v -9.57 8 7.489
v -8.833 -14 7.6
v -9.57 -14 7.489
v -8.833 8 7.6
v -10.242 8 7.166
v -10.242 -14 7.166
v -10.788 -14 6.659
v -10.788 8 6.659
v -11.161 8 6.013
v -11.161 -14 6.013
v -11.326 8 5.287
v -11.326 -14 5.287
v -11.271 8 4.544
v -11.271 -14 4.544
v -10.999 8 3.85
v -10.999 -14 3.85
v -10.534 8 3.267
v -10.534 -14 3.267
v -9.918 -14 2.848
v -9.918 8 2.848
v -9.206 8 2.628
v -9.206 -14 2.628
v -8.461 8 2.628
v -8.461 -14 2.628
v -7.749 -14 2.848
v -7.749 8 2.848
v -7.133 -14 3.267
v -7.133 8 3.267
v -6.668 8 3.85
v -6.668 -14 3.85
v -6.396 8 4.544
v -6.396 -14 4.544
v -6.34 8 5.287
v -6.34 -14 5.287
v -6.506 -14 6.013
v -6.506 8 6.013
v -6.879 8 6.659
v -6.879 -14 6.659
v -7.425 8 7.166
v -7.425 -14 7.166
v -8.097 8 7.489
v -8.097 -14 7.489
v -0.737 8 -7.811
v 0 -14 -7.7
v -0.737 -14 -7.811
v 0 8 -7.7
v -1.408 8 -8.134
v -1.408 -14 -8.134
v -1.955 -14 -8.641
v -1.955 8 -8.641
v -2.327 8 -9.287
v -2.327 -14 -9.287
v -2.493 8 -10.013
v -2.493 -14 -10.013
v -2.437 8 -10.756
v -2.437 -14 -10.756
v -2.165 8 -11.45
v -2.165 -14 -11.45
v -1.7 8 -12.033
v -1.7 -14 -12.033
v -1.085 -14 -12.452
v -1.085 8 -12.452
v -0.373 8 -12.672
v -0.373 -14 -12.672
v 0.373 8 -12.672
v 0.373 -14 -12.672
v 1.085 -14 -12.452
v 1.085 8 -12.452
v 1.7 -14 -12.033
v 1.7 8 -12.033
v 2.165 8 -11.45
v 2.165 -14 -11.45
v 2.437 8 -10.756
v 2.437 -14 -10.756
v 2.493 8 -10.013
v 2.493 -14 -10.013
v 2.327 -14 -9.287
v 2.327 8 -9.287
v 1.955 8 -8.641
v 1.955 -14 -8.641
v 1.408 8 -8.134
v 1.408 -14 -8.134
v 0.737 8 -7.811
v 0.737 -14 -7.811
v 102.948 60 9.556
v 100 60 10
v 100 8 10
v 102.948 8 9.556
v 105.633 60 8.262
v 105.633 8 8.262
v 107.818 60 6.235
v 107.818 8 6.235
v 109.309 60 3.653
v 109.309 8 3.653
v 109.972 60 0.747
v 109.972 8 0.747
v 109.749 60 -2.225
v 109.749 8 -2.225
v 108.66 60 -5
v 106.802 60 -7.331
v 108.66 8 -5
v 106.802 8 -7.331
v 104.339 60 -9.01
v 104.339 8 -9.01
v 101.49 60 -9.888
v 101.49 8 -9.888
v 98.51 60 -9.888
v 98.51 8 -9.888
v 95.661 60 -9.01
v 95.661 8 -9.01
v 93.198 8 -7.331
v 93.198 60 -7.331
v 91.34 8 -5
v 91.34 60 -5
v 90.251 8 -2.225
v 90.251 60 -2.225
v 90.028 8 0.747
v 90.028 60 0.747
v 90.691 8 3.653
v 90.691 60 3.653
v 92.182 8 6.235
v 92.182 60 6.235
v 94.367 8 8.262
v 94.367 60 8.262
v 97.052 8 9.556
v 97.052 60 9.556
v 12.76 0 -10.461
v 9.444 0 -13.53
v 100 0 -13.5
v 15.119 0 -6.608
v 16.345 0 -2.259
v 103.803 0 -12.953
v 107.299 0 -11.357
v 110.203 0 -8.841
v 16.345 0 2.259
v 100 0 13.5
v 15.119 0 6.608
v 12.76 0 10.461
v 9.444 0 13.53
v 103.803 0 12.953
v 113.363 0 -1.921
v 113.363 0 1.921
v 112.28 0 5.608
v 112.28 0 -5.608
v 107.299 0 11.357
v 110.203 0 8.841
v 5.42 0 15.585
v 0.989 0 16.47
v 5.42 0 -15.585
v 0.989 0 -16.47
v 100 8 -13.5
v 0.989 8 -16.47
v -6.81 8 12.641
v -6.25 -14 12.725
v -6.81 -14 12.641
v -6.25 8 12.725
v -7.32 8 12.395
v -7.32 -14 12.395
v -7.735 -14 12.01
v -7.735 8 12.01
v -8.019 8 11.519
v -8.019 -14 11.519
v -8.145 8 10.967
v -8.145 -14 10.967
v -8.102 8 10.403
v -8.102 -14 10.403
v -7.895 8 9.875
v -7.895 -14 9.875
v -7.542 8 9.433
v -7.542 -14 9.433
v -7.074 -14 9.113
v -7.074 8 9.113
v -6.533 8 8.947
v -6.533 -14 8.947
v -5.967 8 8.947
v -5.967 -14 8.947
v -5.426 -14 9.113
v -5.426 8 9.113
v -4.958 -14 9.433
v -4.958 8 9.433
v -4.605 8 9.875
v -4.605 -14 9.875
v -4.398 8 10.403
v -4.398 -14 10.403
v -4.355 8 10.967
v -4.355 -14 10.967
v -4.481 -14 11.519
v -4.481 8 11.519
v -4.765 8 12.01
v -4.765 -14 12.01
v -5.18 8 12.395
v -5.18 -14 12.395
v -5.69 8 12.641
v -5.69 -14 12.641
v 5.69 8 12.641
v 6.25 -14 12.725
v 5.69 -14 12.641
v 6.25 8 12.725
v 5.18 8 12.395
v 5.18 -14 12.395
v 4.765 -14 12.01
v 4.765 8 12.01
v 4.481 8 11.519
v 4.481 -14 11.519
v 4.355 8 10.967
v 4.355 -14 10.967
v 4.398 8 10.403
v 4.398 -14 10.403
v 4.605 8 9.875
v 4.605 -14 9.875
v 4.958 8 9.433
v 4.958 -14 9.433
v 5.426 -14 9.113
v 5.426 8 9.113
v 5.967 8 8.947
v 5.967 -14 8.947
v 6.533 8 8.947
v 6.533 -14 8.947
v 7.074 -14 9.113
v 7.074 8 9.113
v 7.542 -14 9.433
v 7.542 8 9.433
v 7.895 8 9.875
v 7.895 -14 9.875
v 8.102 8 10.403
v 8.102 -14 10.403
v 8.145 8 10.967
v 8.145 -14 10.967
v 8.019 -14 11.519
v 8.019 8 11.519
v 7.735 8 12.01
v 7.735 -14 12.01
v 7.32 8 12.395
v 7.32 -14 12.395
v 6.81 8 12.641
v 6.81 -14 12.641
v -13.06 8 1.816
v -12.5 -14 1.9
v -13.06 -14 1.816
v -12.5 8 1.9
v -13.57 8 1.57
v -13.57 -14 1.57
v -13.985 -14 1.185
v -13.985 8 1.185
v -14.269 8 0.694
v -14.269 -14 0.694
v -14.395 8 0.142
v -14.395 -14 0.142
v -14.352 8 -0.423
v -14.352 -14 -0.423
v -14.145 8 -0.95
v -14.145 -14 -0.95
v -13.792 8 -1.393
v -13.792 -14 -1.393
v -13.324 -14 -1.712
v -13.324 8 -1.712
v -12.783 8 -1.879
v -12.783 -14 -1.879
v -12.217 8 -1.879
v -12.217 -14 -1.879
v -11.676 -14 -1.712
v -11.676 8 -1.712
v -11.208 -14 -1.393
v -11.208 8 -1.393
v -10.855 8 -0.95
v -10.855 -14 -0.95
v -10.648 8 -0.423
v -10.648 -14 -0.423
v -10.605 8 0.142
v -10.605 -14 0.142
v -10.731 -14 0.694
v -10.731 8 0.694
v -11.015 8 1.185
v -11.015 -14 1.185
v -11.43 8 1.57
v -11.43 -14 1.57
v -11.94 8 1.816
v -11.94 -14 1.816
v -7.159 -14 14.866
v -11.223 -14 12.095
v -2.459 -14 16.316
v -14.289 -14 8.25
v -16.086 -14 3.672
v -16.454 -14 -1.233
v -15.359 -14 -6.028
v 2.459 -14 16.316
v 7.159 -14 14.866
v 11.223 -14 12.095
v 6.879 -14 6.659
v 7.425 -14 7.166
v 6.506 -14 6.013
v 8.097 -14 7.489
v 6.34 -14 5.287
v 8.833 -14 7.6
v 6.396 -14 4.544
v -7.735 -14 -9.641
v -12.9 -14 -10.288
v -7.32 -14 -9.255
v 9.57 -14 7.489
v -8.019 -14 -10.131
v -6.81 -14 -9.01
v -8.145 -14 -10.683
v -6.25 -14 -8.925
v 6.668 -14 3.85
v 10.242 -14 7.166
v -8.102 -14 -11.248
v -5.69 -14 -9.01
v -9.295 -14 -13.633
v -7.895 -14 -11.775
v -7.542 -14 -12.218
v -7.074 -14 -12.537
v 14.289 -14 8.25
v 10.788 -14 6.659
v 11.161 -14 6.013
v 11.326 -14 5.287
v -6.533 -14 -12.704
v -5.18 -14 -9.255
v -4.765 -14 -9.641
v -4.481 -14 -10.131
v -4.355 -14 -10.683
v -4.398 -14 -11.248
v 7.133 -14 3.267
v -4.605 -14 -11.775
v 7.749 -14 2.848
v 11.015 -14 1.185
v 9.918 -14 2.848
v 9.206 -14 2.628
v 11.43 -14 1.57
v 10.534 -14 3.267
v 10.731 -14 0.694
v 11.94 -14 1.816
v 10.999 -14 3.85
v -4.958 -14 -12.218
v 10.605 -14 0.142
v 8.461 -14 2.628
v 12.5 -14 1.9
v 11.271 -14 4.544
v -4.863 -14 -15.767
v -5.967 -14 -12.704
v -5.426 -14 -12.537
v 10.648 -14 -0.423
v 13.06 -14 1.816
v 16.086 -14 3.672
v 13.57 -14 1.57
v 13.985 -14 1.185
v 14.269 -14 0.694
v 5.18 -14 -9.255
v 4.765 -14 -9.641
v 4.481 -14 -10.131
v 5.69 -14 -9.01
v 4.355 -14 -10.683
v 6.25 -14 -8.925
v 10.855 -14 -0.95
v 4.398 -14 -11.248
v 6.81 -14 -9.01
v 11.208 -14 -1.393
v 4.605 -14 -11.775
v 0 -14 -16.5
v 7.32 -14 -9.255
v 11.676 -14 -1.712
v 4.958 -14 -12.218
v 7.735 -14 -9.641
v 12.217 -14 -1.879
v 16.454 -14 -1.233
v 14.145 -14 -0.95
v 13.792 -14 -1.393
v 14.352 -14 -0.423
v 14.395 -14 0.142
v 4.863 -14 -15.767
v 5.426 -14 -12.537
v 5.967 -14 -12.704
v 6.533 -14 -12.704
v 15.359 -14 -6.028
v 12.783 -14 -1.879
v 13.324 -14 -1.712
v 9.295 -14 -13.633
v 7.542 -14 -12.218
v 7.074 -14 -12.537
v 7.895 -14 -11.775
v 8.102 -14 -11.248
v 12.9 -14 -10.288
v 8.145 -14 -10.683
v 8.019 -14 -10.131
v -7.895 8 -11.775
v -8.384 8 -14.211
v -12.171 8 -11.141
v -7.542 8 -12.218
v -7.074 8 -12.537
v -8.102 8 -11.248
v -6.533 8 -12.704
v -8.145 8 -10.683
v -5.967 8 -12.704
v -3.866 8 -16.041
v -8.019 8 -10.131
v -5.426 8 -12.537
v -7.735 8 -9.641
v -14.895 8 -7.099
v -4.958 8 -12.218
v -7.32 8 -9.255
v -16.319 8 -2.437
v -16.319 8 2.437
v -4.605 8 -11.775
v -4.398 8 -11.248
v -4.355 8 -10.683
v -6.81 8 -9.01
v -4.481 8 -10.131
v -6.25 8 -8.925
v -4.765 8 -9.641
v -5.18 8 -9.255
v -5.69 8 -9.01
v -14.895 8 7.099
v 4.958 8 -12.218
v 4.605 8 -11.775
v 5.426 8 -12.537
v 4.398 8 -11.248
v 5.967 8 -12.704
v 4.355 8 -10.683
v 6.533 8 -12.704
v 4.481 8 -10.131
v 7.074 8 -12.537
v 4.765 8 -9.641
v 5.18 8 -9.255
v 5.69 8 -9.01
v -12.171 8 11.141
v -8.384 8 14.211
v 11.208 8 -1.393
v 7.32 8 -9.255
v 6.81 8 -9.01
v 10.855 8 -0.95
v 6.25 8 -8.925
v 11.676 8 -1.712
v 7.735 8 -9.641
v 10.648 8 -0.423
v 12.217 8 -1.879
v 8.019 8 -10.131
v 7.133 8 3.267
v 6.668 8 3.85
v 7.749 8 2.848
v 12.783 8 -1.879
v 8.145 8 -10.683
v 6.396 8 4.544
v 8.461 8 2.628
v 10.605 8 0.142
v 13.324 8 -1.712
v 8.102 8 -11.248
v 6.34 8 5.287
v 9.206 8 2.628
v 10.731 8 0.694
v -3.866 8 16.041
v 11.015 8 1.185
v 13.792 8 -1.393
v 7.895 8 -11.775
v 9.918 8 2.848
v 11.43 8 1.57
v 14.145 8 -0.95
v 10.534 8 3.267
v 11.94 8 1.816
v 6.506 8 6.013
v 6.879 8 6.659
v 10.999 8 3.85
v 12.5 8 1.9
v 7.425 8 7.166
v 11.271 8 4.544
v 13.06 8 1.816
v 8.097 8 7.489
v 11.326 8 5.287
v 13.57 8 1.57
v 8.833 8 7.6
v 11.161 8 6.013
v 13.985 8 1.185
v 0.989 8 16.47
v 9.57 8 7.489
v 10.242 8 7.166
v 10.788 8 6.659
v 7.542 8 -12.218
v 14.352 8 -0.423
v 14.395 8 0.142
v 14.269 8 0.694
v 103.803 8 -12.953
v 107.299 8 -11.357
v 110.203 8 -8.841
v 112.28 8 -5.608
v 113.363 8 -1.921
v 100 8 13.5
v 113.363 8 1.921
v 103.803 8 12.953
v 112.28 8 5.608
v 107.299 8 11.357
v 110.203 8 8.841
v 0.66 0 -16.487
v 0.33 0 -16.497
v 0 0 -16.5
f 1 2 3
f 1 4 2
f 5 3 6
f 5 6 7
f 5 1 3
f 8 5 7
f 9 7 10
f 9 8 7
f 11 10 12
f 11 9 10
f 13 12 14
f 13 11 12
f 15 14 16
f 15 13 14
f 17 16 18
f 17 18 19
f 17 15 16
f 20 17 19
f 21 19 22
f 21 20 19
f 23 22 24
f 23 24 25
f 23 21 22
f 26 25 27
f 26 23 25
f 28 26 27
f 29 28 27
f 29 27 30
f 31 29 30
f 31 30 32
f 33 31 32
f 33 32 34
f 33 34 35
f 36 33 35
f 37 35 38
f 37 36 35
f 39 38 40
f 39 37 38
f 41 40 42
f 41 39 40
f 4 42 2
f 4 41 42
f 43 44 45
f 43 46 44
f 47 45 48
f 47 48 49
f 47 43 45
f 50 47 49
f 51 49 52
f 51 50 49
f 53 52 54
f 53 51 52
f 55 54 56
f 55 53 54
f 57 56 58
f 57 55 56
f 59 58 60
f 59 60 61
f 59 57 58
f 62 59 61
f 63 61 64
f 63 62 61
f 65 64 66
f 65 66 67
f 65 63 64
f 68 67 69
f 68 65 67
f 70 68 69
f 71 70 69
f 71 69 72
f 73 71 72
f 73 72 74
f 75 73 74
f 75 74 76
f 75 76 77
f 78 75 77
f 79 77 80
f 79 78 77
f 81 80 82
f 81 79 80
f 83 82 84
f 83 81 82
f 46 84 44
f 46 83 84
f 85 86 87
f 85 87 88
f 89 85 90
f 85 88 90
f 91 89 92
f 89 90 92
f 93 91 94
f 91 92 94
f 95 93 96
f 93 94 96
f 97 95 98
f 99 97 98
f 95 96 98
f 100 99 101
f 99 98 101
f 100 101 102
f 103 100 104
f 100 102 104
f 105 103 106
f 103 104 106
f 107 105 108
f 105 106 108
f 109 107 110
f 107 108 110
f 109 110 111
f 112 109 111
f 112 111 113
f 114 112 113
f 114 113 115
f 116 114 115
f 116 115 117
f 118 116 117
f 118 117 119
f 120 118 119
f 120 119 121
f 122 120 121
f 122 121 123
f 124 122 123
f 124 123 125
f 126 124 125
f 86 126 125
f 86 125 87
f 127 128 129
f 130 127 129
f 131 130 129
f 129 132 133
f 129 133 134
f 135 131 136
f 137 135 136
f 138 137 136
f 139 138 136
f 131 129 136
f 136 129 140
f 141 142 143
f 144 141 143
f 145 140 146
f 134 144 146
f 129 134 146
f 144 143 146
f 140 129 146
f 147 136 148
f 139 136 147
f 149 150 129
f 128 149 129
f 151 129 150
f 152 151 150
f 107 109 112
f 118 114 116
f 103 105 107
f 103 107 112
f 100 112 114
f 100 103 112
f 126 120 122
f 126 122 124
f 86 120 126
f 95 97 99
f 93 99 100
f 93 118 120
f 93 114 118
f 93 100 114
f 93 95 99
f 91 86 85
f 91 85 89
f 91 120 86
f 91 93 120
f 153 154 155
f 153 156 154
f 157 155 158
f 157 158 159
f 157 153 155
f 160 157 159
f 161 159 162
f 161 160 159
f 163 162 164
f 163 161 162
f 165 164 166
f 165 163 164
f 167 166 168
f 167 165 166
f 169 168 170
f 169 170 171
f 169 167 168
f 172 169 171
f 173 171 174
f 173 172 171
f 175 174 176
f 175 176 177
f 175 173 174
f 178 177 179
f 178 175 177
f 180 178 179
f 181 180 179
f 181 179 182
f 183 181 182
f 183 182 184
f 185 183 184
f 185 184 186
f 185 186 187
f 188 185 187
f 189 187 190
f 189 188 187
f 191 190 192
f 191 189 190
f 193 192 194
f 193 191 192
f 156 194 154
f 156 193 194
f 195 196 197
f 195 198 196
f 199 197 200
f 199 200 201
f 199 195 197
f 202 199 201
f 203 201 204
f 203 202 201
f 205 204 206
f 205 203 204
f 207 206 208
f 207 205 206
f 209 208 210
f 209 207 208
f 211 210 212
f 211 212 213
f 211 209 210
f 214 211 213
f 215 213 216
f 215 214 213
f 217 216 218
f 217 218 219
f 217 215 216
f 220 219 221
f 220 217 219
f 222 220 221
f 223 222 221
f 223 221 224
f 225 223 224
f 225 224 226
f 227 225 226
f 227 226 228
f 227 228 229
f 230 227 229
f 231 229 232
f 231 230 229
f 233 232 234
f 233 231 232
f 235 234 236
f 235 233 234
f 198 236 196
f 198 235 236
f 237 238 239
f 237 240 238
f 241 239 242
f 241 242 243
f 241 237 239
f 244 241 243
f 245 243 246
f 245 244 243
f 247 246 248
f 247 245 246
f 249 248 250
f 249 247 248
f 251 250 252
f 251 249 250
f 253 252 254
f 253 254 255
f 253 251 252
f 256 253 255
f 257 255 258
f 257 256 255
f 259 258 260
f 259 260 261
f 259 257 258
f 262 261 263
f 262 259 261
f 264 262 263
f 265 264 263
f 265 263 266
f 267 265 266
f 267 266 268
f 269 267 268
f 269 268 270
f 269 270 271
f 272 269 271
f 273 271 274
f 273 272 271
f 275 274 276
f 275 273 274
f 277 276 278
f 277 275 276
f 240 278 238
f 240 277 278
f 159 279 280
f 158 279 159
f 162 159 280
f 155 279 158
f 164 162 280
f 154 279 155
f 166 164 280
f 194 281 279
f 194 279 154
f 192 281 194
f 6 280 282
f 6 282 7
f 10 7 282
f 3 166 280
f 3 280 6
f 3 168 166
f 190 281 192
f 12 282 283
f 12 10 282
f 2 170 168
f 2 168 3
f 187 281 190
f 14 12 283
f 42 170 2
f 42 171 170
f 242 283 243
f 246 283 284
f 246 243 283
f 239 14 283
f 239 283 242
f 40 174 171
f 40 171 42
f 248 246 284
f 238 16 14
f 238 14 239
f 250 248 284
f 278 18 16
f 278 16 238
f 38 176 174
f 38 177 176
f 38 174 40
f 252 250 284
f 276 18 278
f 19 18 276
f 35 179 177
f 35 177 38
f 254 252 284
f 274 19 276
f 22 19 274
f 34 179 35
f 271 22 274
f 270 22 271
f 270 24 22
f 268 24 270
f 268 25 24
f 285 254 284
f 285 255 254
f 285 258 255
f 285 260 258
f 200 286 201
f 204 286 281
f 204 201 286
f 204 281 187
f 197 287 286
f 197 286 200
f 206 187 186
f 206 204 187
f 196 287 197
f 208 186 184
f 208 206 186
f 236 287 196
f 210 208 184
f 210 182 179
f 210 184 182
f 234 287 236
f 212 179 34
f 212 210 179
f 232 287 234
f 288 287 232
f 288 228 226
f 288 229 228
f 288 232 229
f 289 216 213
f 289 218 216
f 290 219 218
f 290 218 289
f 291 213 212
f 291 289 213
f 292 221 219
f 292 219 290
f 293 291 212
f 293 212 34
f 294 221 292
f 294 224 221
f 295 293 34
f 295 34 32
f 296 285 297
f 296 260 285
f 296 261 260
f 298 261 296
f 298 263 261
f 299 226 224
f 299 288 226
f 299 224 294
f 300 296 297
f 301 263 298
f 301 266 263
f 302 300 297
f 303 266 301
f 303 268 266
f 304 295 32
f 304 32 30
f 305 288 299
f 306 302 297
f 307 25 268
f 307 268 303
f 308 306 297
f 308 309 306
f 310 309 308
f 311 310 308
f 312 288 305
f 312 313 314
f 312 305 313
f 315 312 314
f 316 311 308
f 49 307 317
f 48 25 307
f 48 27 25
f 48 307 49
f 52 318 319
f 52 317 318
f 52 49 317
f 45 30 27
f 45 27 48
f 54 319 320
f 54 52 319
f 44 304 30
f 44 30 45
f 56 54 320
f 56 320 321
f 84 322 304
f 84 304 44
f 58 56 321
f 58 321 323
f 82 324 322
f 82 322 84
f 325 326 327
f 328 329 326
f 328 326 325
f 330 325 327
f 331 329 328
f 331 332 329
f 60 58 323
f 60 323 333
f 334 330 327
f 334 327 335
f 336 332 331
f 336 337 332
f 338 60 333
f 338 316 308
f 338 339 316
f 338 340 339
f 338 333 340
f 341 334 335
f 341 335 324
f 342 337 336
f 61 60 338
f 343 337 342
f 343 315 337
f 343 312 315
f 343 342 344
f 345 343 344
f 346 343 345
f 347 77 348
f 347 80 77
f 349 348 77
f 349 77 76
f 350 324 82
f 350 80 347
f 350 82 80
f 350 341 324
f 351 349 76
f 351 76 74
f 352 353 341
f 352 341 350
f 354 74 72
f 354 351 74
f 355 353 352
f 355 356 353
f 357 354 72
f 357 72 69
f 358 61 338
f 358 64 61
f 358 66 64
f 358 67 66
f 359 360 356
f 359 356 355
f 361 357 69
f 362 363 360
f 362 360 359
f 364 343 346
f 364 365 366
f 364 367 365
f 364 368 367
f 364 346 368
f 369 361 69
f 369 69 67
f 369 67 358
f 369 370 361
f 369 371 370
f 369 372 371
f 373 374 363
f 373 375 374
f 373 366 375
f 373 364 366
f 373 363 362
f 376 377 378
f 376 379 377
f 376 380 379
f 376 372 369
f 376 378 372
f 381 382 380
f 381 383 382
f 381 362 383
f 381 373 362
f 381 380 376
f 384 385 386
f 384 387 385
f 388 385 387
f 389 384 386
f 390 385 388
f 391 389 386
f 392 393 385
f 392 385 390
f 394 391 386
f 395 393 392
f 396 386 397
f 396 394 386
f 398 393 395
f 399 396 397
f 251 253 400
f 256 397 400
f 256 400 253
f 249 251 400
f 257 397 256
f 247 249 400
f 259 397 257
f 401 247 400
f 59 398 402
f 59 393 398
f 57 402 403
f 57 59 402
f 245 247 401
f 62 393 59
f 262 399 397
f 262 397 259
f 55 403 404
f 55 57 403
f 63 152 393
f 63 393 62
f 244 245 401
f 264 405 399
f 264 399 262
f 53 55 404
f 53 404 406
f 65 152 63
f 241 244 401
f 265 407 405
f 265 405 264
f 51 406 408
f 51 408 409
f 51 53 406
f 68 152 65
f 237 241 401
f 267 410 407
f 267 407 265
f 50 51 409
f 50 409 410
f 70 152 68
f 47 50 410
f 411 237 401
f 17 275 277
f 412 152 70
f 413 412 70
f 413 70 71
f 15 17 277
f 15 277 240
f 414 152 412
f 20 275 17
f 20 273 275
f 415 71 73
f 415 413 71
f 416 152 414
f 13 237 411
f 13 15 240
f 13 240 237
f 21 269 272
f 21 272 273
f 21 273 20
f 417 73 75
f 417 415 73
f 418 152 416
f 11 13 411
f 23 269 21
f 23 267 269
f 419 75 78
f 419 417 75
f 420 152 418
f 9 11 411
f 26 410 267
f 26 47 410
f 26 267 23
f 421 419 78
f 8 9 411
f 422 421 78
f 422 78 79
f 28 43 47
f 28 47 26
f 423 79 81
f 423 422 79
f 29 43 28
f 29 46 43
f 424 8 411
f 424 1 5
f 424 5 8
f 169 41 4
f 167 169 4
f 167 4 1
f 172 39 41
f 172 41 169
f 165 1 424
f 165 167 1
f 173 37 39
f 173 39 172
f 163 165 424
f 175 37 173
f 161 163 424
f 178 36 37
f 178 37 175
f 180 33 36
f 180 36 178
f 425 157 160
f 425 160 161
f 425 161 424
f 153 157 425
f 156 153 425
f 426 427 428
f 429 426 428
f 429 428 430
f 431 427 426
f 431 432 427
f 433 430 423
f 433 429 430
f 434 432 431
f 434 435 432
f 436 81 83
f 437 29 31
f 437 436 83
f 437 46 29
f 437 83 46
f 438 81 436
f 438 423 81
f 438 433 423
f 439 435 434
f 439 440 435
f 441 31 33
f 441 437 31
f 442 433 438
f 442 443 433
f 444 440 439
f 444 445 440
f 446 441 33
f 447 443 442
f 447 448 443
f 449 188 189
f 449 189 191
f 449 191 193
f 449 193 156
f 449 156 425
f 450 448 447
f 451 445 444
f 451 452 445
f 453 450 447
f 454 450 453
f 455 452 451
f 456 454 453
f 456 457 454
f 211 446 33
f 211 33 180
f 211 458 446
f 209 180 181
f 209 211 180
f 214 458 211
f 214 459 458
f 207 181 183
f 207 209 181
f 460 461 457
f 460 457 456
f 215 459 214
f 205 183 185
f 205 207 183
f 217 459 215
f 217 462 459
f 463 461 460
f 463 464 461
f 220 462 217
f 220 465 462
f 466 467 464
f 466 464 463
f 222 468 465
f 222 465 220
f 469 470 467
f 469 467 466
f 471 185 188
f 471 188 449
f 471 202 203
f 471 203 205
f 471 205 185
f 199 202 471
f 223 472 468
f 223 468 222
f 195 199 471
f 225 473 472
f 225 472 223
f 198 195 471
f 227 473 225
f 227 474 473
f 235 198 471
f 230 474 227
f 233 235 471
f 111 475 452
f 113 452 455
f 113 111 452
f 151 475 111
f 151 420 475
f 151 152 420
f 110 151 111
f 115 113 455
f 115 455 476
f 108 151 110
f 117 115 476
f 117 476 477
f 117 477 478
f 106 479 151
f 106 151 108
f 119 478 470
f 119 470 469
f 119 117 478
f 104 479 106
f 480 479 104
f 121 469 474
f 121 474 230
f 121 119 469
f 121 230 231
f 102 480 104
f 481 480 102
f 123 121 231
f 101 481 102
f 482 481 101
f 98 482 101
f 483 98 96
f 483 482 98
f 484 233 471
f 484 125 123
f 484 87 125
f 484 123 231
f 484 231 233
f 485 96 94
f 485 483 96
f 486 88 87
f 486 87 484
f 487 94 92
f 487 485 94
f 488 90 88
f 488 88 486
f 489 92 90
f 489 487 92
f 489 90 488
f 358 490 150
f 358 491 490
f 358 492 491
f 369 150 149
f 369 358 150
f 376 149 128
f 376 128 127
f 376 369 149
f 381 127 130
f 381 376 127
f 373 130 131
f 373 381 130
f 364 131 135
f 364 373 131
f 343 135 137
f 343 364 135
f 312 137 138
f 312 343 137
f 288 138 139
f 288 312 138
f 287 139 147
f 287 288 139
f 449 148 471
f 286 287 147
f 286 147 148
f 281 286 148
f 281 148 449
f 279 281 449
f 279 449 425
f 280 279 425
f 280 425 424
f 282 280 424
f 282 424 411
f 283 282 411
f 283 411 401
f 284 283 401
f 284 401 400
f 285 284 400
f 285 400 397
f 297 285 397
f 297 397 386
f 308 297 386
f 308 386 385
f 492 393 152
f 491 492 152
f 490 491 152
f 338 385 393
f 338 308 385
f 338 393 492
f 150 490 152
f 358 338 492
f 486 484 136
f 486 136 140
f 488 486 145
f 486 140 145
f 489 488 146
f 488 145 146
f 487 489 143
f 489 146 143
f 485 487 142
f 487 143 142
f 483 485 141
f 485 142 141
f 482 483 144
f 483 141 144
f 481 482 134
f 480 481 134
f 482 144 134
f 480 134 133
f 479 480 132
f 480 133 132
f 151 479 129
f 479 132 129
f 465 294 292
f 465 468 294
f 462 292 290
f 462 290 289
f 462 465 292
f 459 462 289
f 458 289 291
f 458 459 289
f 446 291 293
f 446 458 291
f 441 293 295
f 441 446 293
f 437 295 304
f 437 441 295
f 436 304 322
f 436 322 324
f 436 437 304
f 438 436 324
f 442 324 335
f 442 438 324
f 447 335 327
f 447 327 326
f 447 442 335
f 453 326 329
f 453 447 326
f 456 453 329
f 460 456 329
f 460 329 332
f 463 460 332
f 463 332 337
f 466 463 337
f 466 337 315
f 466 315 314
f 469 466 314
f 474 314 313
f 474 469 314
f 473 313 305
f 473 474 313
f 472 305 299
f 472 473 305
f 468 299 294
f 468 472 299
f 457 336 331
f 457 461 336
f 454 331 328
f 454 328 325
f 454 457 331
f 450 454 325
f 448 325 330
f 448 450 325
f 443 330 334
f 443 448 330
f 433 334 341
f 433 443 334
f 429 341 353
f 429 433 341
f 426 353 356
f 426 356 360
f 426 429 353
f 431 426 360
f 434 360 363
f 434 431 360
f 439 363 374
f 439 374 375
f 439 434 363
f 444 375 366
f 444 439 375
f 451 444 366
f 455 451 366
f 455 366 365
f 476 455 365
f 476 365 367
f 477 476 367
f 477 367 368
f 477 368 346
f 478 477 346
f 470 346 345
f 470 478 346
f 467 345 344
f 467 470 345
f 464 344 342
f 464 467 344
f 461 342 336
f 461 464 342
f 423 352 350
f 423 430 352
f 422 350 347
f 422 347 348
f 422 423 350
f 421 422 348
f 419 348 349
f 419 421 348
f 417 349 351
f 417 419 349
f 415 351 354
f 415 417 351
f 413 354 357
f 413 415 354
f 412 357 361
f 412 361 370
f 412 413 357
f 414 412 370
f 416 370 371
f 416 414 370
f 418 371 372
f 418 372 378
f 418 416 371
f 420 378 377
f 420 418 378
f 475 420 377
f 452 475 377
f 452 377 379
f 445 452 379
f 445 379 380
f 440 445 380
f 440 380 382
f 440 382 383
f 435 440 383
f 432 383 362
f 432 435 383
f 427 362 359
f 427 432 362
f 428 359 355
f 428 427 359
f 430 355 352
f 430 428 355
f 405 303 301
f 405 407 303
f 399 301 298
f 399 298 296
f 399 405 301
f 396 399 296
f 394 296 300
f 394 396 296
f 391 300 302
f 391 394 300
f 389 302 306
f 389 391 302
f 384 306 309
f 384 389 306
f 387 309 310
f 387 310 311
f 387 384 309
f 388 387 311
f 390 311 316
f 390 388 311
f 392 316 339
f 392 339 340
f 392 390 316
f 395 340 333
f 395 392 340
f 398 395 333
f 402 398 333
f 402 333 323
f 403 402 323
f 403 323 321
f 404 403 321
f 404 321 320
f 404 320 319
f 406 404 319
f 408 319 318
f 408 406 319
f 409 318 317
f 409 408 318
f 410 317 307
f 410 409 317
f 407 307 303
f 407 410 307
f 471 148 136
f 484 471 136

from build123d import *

# Parameters (mm, degrees)
SKETCH_1_R               = 16.5
EXTRUDE_1_DEPTH          = 8
CUT_EXTRUDE_1_DEPTH      = 25.667792767
CUT_EXTRUDE_1_DEPTH_BACK = 25.667792767
SKETCH_4_R               = 2.5
SKETCH_4_R_2             = 1.9
SKETCH_1_3_R             = 10
EXTRUDE_2_DEPTH          = 8
EXTRUDE_3_DEPTH          = 60
EXTRUDE_START            = 14
SKETCH_5_R               = 16.5
EXTRUDE_4_DEPTH          = 14
CUT_EXTRUDE_START        = -14
SKETCH_6_R               = 2.5
SKETCH_6_R_2             = 1.9
CUT_EXTRUDE_2_DEPTH      = 14


with BuildPart() as part:
    # 草图1 → 凸台-拉伸1 (new body)
    with BuildSketch(Plane(origin=(0, 0, 0), x_dir=(1, 0, 0), z_dir=(0, 1, 0))):
        Circle(SKETCH_1_R)
    extrude(amount=EXTRUDE_1_DEPTH)

    # 草图4 → 切除-拉伸1 (cut, two sides: drawn at the far end of the back side and taken through both)
    with BuildSketch(Plane(origin=(0, 8, 0), x_dir=(1, 0, 0), z_dir=(0, 1, 0)).offset(-CUT_EXTRUDE_1_DEPTH_BACK)):
        with Locations((0, 10.2)):
            Circle(SKETCH_4_R)
        with Locations((-6.25, 10.825317547)):
            Circle(SKETCH_4_R_2)
        with Locations((6.25, 10.825317547)):
            Circle(SKETCH_4_R_2)
        with Locations((12.5, 0)):
            Circle(SKETCH_4_R_2)
        with Locations((6.25, -10.825317547)):
            Circle(SKETCH_4_R_2)
        with Locations((-6.25, -10.825317547)):
            Circle(SKETCH_4_R_2)
        with Locations((-12.5, 0)):
            Circle(SKETCH_4_R_2)
        with Locations((8.833459119, -5.1)):
            Circle(SKETCH_4_R)
        with Locations((-8.833459119, -5.1)):
            Circle(SKETCH_4_R)
    extrude(amount=CUT_EXTRUDE_1_DEPTH + CUT_EXTRUDE_1_DEPTH_BACK, mode=Mode.SUBTRACT)

    # 草图1<3> → 凸台-拉伸2 (add)
    with BuildSketch(Plane(origin=(0, 0, 0), x_dir=(1, 0, 0), z_dir=(0, 1, 0))):
        with BuildLine():
            ThreePointArc((0.989109801, 16.470326706), (16.5, 0), (0.989109801, -16.470326706))
            Line((0.989109801, -16.470326706), (100, -13.5))
            ThreePointArc((100, -13.5), (113.5, 0), (100, 13.5))
            Line((100, 13.5), (0.989109801, 16.470326706))
        make_face()
        with Locations((100, 0)):
            Circle(SKETCH_1_3_R, mode=Mode.SUBTRACT)
    extrude(amount=EXTRUDE_2_DEPTH)

    # 草图1<4> → 凸台-拉伸3 (add)
    with BuildSketch(Plane(origin=(0, 0, 0), x_dir=(1, 0, 0), z_dir=(0, 1, 0))):
        with BuildLine():
            ThreePointArc((110, 0), (100, 10), (90, 0))
            ThreePointArc((90, 0), (100, -10), (110, 0))
        make_face()
    extrude(amount=EXTRUDE_3_DEPTH)

    # 草图5 → 凸台-拉伸4 (add)
    with BuildSketch(Plane.XZ.offset(EXTRUDE_START)):
        Circle(SKETCH_5_R)
    extrude(amount=-EXTRUDE_4_DEPTH)

    # 草图6 → 切除-拉伸2 (cut)
    with BuildSketch(Plane.XZ.offset(14).offset(CUT_EXTRUDE_START)):
        with Locations((-8.833459119, 5.1)):
            Circle(SKETCH_6_R)
        with Locations((-12.5, 0)):
            Circle(SKETCH_6_R_2)
        with Locations((-6.25, -10.825317547)):
            Circle(SKETCH_6_R_2)
        with Locations((0, -10.2)):
            Circle(SKETCH_6_R)
        with Locations((6.25, -10.825317547)):
            Circle(SKETCH_6_R_2)
        with Locations((12.5, 0)):
            Circle(SKETCH_6_R_2)
        with Locations((8.833459119, 5.1)):
            Circle(SKETCH_6_R)
        with Locations((6.25, 10.825317547)):
            Circle(SKETCH_6_R_2)
        with Locations((-6.25, 10.825317547)):
            Circle(SKETCH_6_R_2)
    extrude(amount=CUT_EXTRUDE_2_DEPTH, mode=Mode.SUBTRACT)


solid = part.part
